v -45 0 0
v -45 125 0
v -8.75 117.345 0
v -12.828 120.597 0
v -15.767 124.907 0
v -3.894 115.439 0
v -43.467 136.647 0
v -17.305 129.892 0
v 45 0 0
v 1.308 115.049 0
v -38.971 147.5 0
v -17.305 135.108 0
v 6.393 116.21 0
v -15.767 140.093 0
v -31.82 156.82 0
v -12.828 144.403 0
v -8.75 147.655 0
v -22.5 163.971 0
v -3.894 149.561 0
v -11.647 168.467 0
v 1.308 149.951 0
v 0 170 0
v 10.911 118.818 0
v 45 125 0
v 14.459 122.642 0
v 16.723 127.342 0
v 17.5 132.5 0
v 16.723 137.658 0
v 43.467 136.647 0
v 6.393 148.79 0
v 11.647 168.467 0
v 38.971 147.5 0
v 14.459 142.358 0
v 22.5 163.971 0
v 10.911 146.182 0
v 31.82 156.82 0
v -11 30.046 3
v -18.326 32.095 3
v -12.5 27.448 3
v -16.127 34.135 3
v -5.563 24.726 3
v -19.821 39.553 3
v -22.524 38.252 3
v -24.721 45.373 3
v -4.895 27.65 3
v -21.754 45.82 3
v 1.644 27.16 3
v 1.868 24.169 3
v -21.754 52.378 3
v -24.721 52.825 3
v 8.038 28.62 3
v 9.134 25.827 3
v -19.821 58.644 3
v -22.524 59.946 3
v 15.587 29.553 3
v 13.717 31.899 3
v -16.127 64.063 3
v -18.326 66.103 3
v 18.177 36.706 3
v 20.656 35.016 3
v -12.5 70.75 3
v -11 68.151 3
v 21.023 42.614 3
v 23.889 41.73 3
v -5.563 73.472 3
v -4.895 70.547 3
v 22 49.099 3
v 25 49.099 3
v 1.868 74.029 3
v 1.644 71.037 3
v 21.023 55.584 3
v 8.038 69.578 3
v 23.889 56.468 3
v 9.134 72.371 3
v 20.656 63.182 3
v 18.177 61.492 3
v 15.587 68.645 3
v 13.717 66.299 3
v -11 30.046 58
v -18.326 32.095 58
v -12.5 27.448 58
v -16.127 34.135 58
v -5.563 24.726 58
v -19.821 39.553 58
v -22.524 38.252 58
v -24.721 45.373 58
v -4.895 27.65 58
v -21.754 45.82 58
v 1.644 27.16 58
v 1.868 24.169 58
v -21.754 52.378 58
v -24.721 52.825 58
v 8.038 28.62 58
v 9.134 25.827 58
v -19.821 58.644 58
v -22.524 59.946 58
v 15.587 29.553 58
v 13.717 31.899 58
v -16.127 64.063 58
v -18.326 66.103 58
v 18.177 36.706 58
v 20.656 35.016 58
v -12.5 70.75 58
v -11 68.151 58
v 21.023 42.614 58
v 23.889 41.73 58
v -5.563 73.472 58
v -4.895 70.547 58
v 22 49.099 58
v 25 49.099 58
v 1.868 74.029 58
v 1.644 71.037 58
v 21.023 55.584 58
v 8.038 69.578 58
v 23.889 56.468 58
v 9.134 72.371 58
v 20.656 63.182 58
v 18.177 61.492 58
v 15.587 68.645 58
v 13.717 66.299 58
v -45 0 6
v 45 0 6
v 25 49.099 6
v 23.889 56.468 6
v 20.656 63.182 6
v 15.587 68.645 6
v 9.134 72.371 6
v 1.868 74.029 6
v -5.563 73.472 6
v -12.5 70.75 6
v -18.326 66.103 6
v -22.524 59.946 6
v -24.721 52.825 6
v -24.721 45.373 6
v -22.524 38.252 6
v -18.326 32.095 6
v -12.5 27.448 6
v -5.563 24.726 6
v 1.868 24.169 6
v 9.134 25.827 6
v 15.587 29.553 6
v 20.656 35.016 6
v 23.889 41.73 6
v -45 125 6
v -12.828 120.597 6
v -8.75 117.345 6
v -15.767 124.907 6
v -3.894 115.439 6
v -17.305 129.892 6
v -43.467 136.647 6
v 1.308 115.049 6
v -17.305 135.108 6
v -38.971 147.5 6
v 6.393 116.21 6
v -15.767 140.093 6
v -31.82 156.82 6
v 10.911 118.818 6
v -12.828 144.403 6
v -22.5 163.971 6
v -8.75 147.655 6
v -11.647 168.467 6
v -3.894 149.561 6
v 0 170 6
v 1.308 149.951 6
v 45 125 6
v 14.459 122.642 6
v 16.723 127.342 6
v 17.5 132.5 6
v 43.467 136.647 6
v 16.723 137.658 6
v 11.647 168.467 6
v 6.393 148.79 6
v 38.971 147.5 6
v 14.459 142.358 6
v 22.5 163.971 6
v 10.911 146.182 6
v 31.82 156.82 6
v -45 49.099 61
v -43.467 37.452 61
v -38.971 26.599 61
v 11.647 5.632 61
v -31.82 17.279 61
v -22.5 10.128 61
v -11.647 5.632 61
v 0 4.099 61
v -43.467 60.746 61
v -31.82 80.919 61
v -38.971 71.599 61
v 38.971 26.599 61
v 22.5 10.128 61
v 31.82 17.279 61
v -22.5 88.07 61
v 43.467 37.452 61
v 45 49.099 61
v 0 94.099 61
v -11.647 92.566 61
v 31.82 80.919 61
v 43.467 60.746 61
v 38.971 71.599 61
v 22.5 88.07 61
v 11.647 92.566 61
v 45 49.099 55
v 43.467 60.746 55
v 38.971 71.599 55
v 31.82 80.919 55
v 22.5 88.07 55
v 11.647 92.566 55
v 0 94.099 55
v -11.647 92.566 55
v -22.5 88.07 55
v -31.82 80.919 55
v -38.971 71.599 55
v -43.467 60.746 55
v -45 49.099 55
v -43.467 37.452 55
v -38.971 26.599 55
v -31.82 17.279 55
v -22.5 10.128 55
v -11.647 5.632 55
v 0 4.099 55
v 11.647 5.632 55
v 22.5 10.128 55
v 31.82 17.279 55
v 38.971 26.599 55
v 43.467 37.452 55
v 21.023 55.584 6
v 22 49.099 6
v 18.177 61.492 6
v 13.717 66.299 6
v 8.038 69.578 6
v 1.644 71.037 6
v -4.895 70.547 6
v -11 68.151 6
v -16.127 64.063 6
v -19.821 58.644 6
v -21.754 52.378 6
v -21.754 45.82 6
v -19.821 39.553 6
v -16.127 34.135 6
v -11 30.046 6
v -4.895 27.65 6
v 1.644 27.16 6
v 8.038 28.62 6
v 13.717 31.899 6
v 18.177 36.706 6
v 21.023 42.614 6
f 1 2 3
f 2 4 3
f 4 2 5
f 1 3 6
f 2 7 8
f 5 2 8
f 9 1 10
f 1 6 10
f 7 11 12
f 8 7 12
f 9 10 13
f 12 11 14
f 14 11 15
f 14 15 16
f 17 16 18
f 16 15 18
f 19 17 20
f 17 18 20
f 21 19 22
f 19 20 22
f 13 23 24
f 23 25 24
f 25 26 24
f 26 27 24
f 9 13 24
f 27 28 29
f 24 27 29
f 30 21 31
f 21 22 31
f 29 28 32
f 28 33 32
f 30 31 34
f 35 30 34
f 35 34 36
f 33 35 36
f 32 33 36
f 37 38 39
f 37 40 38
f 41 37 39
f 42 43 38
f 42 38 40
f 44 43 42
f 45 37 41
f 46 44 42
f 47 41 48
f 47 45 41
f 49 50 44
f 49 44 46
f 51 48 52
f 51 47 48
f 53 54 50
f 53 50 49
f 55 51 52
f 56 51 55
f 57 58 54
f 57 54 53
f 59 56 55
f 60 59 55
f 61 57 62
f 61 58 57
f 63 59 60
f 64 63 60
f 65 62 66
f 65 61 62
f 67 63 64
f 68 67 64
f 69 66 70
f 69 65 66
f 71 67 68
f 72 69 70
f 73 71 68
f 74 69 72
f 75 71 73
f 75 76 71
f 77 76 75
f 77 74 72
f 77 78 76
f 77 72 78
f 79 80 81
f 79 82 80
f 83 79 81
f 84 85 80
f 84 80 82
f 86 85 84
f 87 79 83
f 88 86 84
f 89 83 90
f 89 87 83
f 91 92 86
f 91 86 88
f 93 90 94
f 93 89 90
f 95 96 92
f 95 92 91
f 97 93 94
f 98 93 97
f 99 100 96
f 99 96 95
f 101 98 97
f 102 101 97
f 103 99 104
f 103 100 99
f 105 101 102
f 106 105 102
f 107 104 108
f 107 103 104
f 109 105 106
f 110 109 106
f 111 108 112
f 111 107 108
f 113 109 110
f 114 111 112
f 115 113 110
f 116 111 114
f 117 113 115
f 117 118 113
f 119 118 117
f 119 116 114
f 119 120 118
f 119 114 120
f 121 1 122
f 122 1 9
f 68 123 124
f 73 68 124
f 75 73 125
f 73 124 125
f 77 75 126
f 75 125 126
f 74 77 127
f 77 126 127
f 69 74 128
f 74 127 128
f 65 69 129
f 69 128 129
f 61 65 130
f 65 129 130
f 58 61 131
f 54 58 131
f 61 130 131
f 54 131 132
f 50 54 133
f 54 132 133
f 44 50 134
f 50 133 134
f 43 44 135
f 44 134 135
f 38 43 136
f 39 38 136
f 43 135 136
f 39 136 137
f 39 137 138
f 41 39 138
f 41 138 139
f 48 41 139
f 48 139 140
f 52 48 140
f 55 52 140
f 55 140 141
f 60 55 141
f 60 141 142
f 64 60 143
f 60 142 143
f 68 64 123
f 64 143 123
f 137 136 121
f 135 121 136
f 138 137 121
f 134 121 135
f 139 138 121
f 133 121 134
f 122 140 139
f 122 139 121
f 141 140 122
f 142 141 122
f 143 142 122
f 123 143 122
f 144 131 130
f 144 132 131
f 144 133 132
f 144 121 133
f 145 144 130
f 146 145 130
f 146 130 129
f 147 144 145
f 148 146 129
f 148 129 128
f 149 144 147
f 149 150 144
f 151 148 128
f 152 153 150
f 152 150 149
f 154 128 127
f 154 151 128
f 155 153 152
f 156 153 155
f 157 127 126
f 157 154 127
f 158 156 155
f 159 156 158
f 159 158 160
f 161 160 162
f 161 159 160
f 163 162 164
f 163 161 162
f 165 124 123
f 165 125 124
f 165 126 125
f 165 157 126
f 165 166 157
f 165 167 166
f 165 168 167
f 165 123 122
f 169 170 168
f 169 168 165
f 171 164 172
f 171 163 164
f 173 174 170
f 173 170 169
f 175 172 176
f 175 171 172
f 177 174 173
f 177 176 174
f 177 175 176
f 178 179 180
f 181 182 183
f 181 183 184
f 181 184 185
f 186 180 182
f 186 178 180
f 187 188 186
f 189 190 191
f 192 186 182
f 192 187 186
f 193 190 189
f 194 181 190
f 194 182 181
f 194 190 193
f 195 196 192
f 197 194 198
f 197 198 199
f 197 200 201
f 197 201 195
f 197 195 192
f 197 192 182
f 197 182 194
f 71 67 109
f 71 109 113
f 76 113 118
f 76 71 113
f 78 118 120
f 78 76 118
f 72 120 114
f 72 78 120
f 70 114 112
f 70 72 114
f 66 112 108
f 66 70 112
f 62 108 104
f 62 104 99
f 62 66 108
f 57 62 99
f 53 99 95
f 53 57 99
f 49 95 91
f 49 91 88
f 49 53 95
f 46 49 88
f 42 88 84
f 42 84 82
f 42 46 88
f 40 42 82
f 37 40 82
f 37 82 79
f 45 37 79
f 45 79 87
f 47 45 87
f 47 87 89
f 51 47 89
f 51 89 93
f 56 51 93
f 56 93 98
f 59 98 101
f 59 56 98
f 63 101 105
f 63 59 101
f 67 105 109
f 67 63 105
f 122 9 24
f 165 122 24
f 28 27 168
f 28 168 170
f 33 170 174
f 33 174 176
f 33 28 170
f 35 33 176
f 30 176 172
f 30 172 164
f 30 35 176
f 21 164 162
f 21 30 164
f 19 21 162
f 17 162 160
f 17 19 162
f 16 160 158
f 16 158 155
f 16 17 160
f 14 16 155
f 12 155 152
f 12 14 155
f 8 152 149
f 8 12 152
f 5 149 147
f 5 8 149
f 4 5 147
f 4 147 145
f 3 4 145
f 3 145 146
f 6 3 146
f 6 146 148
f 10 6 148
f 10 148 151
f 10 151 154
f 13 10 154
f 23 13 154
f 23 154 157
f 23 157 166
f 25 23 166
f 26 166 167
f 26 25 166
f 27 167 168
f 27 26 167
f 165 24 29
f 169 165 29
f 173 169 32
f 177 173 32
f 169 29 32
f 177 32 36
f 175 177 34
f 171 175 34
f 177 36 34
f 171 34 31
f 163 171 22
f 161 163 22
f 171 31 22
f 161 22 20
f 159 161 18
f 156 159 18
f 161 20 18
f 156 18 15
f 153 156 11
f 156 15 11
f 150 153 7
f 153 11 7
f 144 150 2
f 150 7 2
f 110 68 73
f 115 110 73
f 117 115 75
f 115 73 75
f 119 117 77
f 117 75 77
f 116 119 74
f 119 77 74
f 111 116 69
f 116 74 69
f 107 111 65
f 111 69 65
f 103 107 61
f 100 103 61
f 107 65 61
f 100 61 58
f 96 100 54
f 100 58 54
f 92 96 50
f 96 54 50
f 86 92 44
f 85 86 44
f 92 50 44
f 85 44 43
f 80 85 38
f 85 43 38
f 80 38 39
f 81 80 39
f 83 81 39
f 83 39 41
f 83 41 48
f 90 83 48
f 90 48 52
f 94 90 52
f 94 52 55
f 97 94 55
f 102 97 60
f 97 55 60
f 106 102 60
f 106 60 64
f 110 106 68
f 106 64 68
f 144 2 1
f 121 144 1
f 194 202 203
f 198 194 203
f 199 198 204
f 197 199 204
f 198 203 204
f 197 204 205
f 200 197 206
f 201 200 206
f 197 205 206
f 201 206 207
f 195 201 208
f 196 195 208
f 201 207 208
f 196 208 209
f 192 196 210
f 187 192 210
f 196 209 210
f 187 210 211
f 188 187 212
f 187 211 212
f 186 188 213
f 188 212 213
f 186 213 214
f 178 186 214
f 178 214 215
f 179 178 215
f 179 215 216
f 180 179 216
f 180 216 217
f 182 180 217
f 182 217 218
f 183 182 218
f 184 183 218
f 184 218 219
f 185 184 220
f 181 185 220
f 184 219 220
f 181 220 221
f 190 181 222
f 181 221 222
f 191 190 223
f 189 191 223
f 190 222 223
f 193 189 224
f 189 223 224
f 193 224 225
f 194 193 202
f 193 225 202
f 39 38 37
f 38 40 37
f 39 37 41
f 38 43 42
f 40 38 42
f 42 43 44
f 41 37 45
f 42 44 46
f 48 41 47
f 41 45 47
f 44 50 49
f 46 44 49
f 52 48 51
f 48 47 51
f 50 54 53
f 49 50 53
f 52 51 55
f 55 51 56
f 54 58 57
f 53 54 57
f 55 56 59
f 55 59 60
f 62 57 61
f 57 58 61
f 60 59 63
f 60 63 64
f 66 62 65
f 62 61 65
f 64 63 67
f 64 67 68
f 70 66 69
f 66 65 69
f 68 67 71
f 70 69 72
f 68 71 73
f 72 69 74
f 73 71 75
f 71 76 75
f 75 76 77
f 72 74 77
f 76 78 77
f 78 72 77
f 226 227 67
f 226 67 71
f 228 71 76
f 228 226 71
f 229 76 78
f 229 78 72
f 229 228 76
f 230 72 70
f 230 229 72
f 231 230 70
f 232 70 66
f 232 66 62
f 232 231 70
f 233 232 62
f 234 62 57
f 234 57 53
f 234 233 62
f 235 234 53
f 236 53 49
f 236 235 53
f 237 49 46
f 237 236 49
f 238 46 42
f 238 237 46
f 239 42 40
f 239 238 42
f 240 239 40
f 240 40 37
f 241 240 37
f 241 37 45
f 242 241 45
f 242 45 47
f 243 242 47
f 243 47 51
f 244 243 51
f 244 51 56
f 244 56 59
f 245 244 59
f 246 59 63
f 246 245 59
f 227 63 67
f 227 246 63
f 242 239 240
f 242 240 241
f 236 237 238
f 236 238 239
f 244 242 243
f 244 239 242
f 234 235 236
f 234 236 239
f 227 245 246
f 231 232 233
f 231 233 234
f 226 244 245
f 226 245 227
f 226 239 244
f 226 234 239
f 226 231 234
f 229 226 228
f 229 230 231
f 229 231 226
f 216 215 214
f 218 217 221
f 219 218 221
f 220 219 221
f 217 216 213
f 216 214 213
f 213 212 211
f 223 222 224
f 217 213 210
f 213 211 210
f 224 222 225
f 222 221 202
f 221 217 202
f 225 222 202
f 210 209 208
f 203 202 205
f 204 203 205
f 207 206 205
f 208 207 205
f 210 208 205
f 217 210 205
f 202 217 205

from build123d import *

# Parameters (mm, degrees)
ESQUISSE2_R             = 17.5
BOSS_EXTRU_1_DEPTH      = 6
ESQUISSE3_R             = 25
ESQUISSE3_R_2           = 22
ENL_V_MAT_EXTRU_1_DEPTH = 3
ESQUISSE4_R             = 25
ESQUISSE4_R_2           = 22
BOSS_EXTRU_2_DEPTH      = 55
BOSS_EXTRU_3_START      = -3
ESQUISSE5_R             = 45
BOSS_EXTRU_3_DEPTH      = 6


with BuildPart() as part:
    # Esquisse2 → Boss.-Extru.1 (new body)
    with BuildSketch(Plane.XY):
        with BuildLine():
            Line((-45, 0), (45, 0))
            Line((45, 0), (45, 125))
            ThreePointArc((45, 125), (0, 170), (-45, 125))
            Line((-45, 125), (-45, 0))
        make_face()
        with Locations((0, 132.5)):
            Circle(ESQUISSE2_R, mode=Mode.SUBTRACT)
    extrude(amount=BOSS_EXTRU_1_DEPTH)

    # Esquisse3 → Enlèv. mat.-Extru.1 (cut)
    with BuildSketch(Plane.XY.offset(6)):
        with Locations((0, 49.098888586)):
            Circle(ESQUISSE3_R)
        with Locations((0, 49.098888586)):
            Circle(ESQUISSE3_R_2, mode=Mode.SUBTRACT)
    extrude(amount=-ENL_V_MAT_EXTRU_1_DEPTH, mode=Mode.SUBTRACT)


with BuildPart() as body_2:
    # Esquisse4 → Boss.-Extru.2 (new body)
    with BuildSketch(Plane.XY.offset(3)):
        with Locations((0, 49.098888586)):
            Circle(ESQUISSE4_R)
        with Locations((0, 49.098888586)):
            Circle(ESQUISSE4_R_2, mode=Mode.SUBTRACT)
    extrude(amount=BOSS_EXTRU_2_DEPTH)


with BuildPart() as body_3:
    # Esquisse5 → Boss.-Extru.3 (new body)
    with BuildSketch(Plane.XY.offset(58).offset(BOSS_EXTRU_3_START)):
        with Locations((0, 49.098888586)):
            Circle(ESQUISSE5_R)
    extrude(amount=BOSS_EXTRU_3_DEPTH)


solid = Compound([part.part, body_2.part, body_3.part])
